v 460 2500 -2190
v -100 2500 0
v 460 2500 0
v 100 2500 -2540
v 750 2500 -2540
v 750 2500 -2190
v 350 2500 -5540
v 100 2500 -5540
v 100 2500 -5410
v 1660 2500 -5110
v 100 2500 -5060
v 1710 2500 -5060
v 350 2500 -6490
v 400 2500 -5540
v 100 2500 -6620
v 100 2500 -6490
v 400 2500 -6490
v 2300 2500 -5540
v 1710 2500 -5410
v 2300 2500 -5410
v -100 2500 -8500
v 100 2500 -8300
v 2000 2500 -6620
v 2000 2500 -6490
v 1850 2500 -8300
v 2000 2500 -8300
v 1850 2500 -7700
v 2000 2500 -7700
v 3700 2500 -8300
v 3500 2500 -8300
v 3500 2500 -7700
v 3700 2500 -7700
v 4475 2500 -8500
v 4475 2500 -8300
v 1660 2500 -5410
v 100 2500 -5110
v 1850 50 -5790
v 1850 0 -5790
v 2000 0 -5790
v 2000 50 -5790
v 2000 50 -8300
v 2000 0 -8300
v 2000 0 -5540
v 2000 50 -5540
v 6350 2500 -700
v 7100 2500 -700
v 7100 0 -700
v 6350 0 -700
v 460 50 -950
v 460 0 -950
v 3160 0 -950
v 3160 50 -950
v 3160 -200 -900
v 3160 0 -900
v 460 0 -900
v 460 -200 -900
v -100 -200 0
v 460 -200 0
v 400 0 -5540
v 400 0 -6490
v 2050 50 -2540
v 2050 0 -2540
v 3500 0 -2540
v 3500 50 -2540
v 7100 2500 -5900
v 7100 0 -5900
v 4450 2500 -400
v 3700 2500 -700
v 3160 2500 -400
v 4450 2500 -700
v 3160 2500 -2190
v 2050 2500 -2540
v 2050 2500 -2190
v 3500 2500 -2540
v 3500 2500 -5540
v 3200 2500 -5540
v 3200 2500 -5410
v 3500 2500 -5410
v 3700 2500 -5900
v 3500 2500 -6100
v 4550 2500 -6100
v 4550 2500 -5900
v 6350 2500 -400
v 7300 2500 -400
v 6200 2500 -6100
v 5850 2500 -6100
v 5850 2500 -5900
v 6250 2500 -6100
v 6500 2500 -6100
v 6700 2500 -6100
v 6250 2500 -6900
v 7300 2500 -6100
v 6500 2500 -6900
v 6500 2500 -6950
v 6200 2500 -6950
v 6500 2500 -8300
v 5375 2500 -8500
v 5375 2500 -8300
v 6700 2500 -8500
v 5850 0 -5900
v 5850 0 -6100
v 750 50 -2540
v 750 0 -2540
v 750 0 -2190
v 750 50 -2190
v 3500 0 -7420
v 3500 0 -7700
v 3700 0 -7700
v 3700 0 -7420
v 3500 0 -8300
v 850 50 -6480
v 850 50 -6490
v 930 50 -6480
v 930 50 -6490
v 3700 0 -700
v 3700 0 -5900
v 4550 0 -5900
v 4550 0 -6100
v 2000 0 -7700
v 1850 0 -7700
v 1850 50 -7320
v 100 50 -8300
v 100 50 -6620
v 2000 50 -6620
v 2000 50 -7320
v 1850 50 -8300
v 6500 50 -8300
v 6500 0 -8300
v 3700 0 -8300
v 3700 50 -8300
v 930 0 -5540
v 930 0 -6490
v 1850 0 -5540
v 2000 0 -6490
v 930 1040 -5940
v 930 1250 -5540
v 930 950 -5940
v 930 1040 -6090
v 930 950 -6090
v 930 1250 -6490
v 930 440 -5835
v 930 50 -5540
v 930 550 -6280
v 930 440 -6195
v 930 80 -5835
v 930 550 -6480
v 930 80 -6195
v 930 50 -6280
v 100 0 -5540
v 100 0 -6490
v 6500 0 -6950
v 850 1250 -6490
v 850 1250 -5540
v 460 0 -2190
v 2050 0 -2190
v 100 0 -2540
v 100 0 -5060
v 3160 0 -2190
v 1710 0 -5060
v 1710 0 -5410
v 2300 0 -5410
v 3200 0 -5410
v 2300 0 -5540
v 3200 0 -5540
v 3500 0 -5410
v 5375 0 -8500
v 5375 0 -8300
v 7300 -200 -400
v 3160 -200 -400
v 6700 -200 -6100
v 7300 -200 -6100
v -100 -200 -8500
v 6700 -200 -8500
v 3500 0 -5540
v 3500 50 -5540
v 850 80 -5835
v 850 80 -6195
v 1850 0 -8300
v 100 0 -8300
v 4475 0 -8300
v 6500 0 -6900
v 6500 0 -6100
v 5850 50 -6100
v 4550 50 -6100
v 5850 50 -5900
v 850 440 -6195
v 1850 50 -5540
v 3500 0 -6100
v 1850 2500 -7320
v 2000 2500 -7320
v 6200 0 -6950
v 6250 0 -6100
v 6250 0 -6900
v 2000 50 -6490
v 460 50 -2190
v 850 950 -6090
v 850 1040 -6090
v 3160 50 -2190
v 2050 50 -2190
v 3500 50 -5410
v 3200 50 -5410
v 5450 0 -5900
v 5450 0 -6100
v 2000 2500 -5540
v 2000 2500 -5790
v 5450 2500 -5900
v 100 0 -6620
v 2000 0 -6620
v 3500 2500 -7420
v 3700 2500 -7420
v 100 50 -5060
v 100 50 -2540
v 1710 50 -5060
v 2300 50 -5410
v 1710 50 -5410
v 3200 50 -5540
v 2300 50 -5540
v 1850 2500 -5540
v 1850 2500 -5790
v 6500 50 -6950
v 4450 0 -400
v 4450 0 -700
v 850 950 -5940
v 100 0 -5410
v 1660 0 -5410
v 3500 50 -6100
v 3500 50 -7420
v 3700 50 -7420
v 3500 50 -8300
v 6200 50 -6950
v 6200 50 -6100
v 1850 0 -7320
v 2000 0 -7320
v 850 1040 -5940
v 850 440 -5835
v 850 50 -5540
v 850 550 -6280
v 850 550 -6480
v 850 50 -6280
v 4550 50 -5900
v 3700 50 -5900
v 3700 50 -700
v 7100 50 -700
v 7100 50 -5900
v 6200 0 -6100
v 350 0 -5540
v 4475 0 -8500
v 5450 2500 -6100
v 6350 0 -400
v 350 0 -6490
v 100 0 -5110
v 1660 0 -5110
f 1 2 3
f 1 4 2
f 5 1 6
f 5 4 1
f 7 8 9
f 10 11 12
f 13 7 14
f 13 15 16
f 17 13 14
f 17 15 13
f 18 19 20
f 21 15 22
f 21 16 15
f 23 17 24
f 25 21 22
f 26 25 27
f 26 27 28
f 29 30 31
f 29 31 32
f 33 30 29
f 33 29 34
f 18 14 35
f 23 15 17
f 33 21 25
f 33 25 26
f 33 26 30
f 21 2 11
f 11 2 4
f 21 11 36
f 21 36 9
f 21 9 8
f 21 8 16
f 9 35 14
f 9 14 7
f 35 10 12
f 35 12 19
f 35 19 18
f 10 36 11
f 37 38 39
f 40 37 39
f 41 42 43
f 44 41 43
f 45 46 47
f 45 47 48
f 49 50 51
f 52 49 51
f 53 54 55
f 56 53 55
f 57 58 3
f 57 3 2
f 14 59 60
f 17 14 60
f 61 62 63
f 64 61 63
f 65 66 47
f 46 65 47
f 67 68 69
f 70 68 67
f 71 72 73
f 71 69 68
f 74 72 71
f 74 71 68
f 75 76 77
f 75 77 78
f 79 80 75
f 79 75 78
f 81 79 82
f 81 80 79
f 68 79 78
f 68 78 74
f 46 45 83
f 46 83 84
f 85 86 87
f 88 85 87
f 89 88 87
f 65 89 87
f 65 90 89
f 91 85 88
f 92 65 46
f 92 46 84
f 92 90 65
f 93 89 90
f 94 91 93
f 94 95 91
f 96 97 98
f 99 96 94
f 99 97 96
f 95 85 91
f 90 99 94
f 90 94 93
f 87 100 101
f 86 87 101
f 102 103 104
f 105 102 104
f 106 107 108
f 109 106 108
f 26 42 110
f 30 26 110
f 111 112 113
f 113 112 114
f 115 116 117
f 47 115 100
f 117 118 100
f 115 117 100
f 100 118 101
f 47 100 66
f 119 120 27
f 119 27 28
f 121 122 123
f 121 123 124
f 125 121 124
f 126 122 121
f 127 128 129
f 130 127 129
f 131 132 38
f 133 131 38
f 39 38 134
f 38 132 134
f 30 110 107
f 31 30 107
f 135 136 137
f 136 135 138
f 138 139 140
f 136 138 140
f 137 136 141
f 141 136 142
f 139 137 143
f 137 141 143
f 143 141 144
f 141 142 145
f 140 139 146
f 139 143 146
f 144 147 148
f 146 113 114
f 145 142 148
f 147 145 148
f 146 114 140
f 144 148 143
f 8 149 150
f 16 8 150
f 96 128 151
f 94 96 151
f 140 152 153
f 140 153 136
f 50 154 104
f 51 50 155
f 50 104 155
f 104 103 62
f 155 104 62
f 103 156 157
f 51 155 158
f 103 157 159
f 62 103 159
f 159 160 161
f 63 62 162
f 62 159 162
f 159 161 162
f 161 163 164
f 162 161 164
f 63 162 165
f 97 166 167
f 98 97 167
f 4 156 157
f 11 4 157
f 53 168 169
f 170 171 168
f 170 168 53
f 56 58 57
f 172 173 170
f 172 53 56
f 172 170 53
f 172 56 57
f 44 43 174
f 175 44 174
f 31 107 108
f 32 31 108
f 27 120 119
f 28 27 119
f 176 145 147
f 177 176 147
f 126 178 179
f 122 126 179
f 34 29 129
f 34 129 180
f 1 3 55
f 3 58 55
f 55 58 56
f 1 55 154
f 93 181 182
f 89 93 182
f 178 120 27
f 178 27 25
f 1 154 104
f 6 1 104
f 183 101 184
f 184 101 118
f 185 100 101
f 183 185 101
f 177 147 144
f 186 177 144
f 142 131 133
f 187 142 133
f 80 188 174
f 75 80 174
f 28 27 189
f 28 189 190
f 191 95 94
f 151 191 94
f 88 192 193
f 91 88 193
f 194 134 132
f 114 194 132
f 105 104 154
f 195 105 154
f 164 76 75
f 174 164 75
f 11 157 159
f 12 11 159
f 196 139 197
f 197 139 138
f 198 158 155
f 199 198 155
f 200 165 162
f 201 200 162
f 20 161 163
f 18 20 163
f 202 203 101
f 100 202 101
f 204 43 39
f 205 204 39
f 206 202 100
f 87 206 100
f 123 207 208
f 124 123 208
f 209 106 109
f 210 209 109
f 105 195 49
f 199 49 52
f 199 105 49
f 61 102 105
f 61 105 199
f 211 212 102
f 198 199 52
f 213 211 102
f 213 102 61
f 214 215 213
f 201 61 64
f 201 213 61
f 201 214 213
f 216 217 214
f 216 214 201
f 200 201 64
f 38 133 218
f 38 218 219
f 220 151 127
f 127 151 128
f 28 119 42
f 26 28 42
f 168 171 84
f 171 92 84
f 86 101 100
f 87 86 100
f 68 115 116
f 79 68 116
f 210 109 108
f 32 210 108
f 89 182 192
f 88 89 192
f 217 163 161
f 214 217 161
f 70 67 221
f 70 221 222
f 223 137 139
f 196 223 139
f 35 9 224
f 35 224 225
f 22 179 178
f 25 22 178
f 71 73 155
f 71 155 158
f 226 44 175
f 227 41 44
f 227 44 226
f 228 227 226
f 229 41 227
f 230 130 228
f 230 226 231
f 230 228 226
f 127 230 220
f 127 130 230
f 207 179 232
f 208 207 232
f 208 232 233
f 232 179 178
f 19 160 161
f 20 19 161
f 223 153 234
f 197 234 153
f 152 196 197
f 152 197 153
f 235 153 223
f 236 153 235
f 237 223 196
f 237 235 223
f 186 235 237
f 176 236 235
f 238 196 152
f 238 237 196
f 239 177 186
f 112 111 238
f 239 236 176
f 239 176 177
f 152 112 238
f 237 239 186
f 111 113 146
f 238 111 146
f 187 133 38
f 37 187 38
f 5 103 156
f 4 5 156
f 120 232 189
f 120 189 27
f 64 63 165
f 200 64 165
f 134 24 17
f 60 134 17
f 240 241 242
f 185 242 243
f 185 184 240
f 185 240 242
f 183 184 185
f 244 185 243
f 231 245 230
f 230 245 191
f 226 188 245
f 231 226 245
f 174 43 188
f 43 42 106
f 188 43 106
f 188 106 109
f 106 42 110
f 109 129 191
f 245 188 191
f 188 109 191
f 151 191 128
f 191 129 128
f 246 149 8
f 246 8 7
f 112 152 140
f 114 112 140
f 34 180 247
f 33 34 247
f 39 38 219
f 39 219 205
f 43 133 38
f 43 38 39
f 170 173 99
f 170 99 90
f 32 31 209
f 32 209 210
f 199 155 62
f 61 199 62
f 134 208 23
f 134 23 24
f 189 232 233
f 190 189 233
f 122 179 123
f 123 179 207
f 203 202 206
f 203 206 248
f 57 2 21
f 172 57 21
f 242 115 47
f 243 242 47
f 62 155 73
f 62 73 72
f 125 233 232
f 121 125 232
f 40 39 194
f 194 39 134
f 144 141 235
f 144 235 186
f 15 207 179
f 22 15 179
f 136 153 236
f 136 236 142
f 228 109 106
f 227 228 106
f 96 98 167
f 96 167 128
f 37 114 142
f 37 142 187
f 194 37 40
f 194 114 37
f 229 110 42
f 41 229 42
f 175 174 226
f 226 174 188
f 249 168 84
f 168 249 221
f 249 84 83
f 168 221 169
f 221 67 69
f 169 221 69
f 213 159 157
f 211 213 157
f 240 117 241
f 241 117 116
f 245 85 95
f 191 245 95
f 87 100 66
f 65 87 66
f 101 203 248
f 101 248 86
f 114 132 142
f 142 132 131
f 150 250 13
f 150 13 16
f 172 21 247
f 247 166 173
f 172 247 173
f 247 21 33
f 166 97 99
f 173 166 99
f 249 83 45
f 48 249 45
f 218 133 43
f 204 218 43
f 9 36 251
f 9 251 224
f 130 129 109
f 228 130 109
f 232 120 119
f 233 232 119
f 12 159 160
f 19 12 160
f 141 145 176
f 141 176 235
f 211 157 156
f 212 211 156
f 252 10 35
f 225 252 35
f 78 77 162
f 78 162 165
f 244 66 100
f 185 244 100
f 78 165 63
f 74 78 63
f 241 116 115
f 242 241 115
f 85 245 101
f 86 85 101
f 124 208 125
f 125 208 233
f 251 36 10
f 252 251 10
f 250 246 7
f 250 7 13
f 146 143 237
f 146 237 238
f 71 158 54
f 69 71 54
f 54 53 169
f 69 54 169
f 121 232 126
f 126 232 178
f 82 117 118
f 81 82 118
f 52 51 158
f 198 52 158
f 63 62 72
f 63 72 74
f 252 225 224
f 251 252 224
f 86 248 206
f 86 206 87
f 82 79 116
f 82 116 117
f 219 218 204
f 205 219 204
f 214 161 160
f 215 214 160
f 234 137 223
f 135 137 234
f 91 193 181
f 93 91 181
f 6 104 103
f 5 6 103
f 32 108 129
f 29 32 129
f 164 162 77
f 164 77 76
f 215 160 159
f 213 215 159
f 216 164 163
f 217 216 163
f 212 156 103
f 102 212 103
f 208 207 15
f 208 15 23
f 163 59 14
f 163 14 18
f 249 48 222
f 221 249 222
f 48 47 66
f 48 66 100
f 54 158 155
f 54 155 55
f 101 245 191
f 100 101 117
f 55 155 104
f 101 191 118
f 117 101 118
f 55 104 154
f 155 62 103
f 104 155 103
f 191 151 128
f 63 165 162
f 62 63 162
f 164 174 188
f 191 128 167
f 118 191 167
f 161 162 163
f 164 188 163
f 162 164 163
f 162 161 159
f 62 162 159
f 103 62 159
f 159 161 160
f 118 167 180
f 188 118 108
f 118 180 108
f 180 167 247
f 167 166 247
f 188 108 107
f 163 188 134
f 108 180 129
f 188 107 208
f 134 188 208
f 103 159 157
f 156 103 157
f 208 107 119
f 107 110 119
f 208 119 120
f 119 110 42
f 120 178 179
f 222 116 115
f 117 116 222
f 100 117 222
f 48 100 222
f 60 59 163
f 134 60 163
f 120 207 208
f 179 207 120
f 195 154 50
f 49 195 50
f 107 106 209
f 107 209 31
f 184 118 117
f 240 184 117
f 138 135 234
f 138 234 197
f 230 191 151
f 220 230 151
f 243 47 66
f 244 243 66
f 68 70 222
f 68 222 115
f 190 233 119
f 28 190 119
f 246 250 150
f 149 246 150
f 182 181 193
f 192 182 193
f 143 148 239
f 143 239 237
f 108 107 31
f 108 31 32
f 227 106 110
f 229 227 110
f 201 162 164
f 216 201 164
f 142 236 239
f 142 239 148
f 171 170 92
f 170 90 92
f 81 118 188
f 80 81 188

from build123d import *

# Parameters (mm, degrees)
EXTRUDE_2786_DEPTH     = 2500
EXTRUDE_2786_2_DEPTH   = 2500
EXTRUDE_2786_3_DEPTH   = 2500
SKETCH_5_W             = 2200
SKETCH_5_H             = 130
SKETCH_5_W_2           = 300
SKETCH_5_W_3           = 150
SKETCH_5_H_2           = 600
EXTRUDE_3628_DEPTH     = 2500
SKETCH_7_W             = 950
SKETCH_7_H             = 100
EXTRUDE_4552_DEPTH     = 2500
SKETCH_8_W             = 1660
SKETCH_8_H             = 400
SKETCH_8_W_2           = 1560
SKETCH_8_H_2           = 300
EXTRUDE_5124_DEPTH     = 2500
SKETCH_9_W             = 350
SKETCH_9_H             = 900
SKETCH_9_W_2           = 250
SKETCH_9_H_2           = 800
SKETCH_9_H_3           = 1050
SKETCH_9_H_4           = 950
EXTRUDE_5639_DEPTH     = 2500
SKETCH_11_W            = 600
SKETCH_11_H            = 350
EXTRUDE_5921_DEPTH     = 600
EXTRUDE_6398_DEPTH     = 200
SKETCH_13_W            = 150
SKETCH_13_H            = 250
SKETCH_13_H_2          = 380
SKETCH_13_W_2          = 600
SKETCH_13_H_3          = 350
CUT_EXTRUDE_7565_DEPTH = 11480.982578384
SKETCH_14_W            = 400
SKETCH_14_H            = 200
EXTRUDE_7970_DEPTH     = 2500
SKETCH_14_W_2          = 150
SKETCH_14_H_2          = 250
EXTRUDE_7970_2_DEPTH   = 2500
SKETCH_14_H_3          = 380
EXTRUDE_7970_3_DEPTH   = 2500
SKETCH_15_W            = 200
SKETCH_15_H            = 280
EXTRUDE_2_DEPTH        = 2500
EXTRUDE_8866_DEPTH     = 50
EXTRUDE_9266_DEPTH     = 50
EXTRUDE_9553_DEPTH     = 50
EXTRUDE_9789_DEPTH     = 50
SKETCH_45_W            = 80
SKETCH_45_H            = 950
EXTRUDE_33_DEPTH       = 1200
SKETCH_46_W            = 360
SKETCH_46_H            = 360
SKETCH_46_W_2          = 150
SKETCH_46_H_2          = 90
SKETCH_46_W_3          = 200
SKETCH_46_H_3          = 500
CUT_EXTRUDE_2_DEPTH    = 80
EXTRUDE_11227_DEPTH    = 50


with BuildPart() as part:
    # Эскиз3 → Extrude 2786 (new body)
    with BuildSketch(Plane(origin=(0, 0, 0), x_dir=(1, 0, 0), z_dir=(0, 1, 0))):
        Polygon((100, 8300), (3500, 8300), (3500, 7700), (3700, 7700), (3700, 8300), (4475, 8300), (4475, 8500), (-100, 8500), (-100, 0), (100, 0), align=None)
    extrude(amount=EXTRUDE_2786_DEPTH)



with BuildPart() as body_2:
    # Эскиз3 → Extrude 2786 2 (new body)
    with BuildSketch(Plane(origin=(0, 0, 0), x_dir=(1, 0, 0), z_dir=(0, 1, 0))):
        Polygon((6500, 6100), (5850, 6100), (5850, 5900), (7100, 5900), (7100, 700), (6350, 700), (6350, 500), (7300, 500), (7300, 6100), (6700, 6100), (6700, 8500), (5375, 8500), (5375, 8300), (6500, 8300), align=None)
    extrude(amount=EXTRUDE_2786_2_DEPTH)


with BuildPart() as body_3:
    # Эскиз3 → Extrude 2786 3 (new body)
    with BuildSketch(Plane(origin=(0, 0, 0), x_dir=(1, 0, 0), z_dir=(0, 1, 0))):
        Polygon((4450, 700), (3700, 700), (3700, 5900), (4550, 5900), (4550, 6100), (3500, 6100), (3500, 500), (4450, 500), align=None)
    extrude(amount=EXTRUDE_2786_3_DEPTH)


with BuildPart() as part_1:
    add(part.part)

    add(body_3.part)  # Extrude 3628 merges body 3
    # Эскиз5 → Extrude 3628 (add)
    with BuildSketch(Plane(origin=(0, 0, 0), x_dir=(1, 0, 0), z_dir=(0, 1, 0))):
        Polygon((100, 6620), (1850, 6620), (1850, 7000), (2000, 7000), (2000, 6240), (1850, 6240), (1850, 6490), (100, 6490), align=None)
        with Locations((1200, 5475)):
            Rectangle(SKETCH_5_W, SKETCH_5_H)
        with Locations((3350, 5475)):
            Rectangle(SKETCH_5_W_2, SKETCH_5_H)
        with Locations((1925, 8000)):
            Rectangle(SKETCH_5_W_3, SKETCH_5_H_2)
    extrude(amount=EXTRUDE_3628_DEPTH)


    add(body_2.part)  # Extrude 4552 merges body 2
    # Эскиз7 → Extrude 4552 (add)
    with BuildSketch(Plane(origin=(0, 0, 0), x_dir=(1, 0, 0), z_dir=(0, 1, 0))):
        Polygon((750, 2190), (750, 2540), (100, 2540), (100, 0), (460, 0), (460, 2190), align=None)
        Polygon((2050, 2190), (3160, 2190), (3160, 400), (4450, 400), (4450, 500), (3500, 500), (3500, 2540), (2050, 2540), align=None)
        with Locations((6825, 450)):
            Rectangle(SKETCH_7_W, SKETCH_7_H)
    extrude(amount=EXTRUDE_4552_DEPTH)

    # Эскиз8 → Extrude 5124 (add)
    with BuildSketch(Plane(origin=(0, 0, 0), x_dir=(1, 0, 0), z_dir=(0, 1, 0))):
        with Locations((880, 5260)):
            Rectangle(SKETCH_8_W, SKETCH_8_H)
        with Locations((880, 5260)):
            Rectangle(SKETCH_8_W_2, SKETCH_8_H_2, mode=Mode.SUBTRACT)
    extrude(amount=EXTRUDE_5124_DEPTH)

    # Эскиз9 → Extrude 5639 (add)
    # profile 1 of 2: a face of its own
    with BuildSketch(Plane(origin=(0, 0, 0), x_dir=(1, 0, 0), z_dir=(0, 1, 0))):
        with Locations((6375, 6500)):
            Rectangle(SKETCH_9_W, SKETCH_9_H)
        with Locations((6375, 6500)):
            Rectangle(SKETCH_9_W_2, SKETCH_9_H_2, mode=Mode.SUBTRACT)
    # profile 2 of 2: a face of its own
    with BuildSketch(Plane(origin=(0, 0, 0), x_dir=(1, 0, 0), z_dir=(0, 1, 0))):
        with Locations((225, 6015)):
            Rectangle(SKETCH_9_W, SKETCH_9_H_3)
        with Locations((225, 6015)):
            Rectangle(SKETCH_9_W_2, SKETCH_9_H_4, mode=Mode.SUBTRACT)
    extrude(amount=EXTRUDE_5639_DEPTH)

    # Эскиз11 → Extrude 5921 (add)
    with BuildSketch(Plane(origin=(0, 0, 0), x_dir=(1, 0, 0), z_dir=(0, 1, 0))):
        with Locations((1750, 2365)):
            Rectangle(SKETCH_11_W, SKETCH_11_H)
    extrude(amount=EXTRUDE_5921_DEPTH)

    # Эскиз4 → Extrude 6398 (add)
    with BuildSketch(Plane(origin=(0, 0, 0), x_dir=(1, 0, 0), z_dir=(0, 1, 0))):
        Polygon((-100, 8500), (6700, 8500), (6700, 6100), (7300, 6100), (7300, 400), (3160, 400), (3160, 900), (460, 900), (460, 0), (-100, 0), align=None)
    extrude(amount=-EXTRUDE_6398_DEPTH)

    # Эскиз13 → Cut-Extrude 7565 (cut, through all)
    with BuildSketch(Plane(origin=(0, 0, 0), x_dir=(1, 0, 0), z_dir=(0, 1, 0))):
        with Locations((1925, 6365)):
            Rectangle(SKETCH_13_W, SKETCH_13_H)
        with Locations((1925, 6810)):
            Rectangle(SKETCH_13_W, SKETCH_13_H_2)
        with Locations((1750, 2365)):
            Rectangle(SKETCH_13_W_2, SKETCH_13_H_3)
    extrude(amount=CUT_EXTRUDE_7565_DEPTH, mode=Mode.SUBTRACT)


with BuildPart() as body_2_2:
    # Эскиз14 → Extrude 7970 (new, through all)
    with BuildSketch(Plane(origin=(0, 0, 0), x_dir=(1, 0, 0), z_dir=(0, 1, 0))):
        with Locations((5650, 6000)):
            Rectangle(SKETCH_14_W, SKETCH_14_H)
    extrude(amount=EXTRUDE_7970_DEPTH)


with BuildPart() as body_3_2:
    # Эскиз14 → Extrude 7970 2 (new, through all)
    with BuildSketch(Plane(origin=(0, 0, 0), x_dir=(1, 0, 0), z_dir=(0, 1, 0))):
        with Locations((1925, 5665)):
            Rectangle(SKETCH_14_W_2, SKETCH_14_H_2)
    extrude(amount=EXTRUDE_7970_2_DEPTH)


with BuildPart() as body_4:
    # Эскиз14 → Extrude 7970 3 (new, through all)
    with BuildSketch(Plane(origin=(0, 0, 0), x_dir=(1, 0, 0), z_dir=(0, 1, 0))):
        with Locations((1925, 7510)):
            Rectangle(SKETCH_14_W_2, SKETCH_14_H_3)
    extrude(amount=EXTRUDE_7970_3_DEPTH)


with BuildPart() as body_5:
    # Эскиз15 → наращивание стен 2 (new, through all)
    with BuildSketch(Plane(origin=(0, 0, 0), x_dir=(1, 0, 0), z_dir=(0, 1, 0))):
        with Locations((3600, 7560)):
            Rectangle(SKETCH_15_W, SKETCH_15_H)
    extrude(amount=EXTRUDE_2_DEPTH)


with BuildPart() as body_6:
    # Эскиз37 → Extrude 8866 (new body)
    with BuildSketch(Plane(origin=(0, 0, 0), x_dir=(1, 0, 0), z_dir=(0, 1, 0))):
        Polygon((3700, 700), (7100, 700), (7100, 5900), (5850, 5900), (5850, 6100), (4550, 6100), (4550, 5900), (3700, 5900), align=None)
    extrude(amount=EXTRUDE_8866_DEPTH)


with BuildPart() as body_7:
    # Эскиз38 → Extrude 9266 (new body)
    with BuildSketch(Plane(origin=(0, 0, 0), x_dir=(1, 0, 0), z_dir=(0, 1, 0))):
        Polygon((460, 950), (3160, 950), (3160, 2190), (2050, 2190), (2050, 2540), (3500, 2540), (3500, 5410), (3200, 5410), (3200, 5540), (2300, 5540), (2300, 5410), (1710, 5410), (1710, 5060), (100, 5060), (100, 2540), (750, 2540), (750, 2190), (460, 2190), align=None)
    extrude(amount=EXTRUDE_9266_DEPTH)


with BuildPart() as body_8:
    # Эскиз40 → Extrude 9553 (new body)
    with BuildSketch(Plane(origin=(0, 0, 0), x_dir=(1, 0, 0), z_dir=(0, 1, 0))):
        Polygon((6200, 6100), (6200, 6950), (6500, 6950), (6500, 8300), (3700, 8300), (3700, 7420), (3500, 7420), (3500, 8300), (2000, 8300), (2000, 5540), (3500, 5540), (3500, 6100), align=None)
    extrude(amount=EXTRUDE_9553_DEPTH)


with BuildPart() as body_9:
    # Эскиз42 → Extrude 9789 (new body)
    with BuildSketch(Plane(origin=(0, 0, 0), x_dir=(1, 0, 0), z_dir=(0, 1, 0))):
        Polygon((100, 8300), (100, 6620), (2000, 6620), (2000, 7320), (1850, 7320), (1850, 8300), align=None)
    extrude(amount=EXTRUDE_9789_DEPTH)


with BuildPart() as body_10:
    # Эскиз45 → Бобышка-Вытянуть33 (new body)
    with BuildSketch(Plane(origin=(0, 50, 0), x_dir=(1, 0, 0), z_dir=(0, 1, 0))):
        with Locations((890, 6015)):
            Rectangle(SKETCH_45_W, SKETCH_45_H)
    extrude(amount=EXTRUDE_33_DEPTH)

    # Эскиз46 → Вырез-Вытянуть2 (cut)
    with BuildSketch(Plane(origin=(930, 0, 0), x_dir=(0, 0, -1), z_dir=(1, 0, 0))):
        with Locations((6015, 260)):
            Rectangle(SKETCH_46_W, SKETCH_46_H)
        with Locations((6015, 995)):
            Rectangle(SKETCH_46_W_2, SKETCH_46_H_2)
        with Locations((6380, 300)):
            Rectangle(SKETCH_46_W_3, SKETCH_46_H_3)
    extrude(amount=-CUT_EXTRUDE_2_DEPTH, mode=Mode.SUBTRACT)


with BuildPart() as body_11:
    # Эскиз43 → Extrude 11227 (new body)
    with BuildSketch(Plane(origin=(0, 0, 0), x_dir=(1, 0, 0), z_dir=(0, 1, 0))):
        Polygon((930, 6490), (930, 5540), (1850, 5540), (1850, 5790), (2000, 5790), (2000, 6490), align=None)
    extrude(amount=EXTRUDE_11227_DEPTH)


solid = Compound([part_1.part, body_2_2.part, body_3_2.part, body_4.part, body_5.part, body_6.part, body_7.part, body_8.part, body_9.part, body_10.part, body_11.part])
